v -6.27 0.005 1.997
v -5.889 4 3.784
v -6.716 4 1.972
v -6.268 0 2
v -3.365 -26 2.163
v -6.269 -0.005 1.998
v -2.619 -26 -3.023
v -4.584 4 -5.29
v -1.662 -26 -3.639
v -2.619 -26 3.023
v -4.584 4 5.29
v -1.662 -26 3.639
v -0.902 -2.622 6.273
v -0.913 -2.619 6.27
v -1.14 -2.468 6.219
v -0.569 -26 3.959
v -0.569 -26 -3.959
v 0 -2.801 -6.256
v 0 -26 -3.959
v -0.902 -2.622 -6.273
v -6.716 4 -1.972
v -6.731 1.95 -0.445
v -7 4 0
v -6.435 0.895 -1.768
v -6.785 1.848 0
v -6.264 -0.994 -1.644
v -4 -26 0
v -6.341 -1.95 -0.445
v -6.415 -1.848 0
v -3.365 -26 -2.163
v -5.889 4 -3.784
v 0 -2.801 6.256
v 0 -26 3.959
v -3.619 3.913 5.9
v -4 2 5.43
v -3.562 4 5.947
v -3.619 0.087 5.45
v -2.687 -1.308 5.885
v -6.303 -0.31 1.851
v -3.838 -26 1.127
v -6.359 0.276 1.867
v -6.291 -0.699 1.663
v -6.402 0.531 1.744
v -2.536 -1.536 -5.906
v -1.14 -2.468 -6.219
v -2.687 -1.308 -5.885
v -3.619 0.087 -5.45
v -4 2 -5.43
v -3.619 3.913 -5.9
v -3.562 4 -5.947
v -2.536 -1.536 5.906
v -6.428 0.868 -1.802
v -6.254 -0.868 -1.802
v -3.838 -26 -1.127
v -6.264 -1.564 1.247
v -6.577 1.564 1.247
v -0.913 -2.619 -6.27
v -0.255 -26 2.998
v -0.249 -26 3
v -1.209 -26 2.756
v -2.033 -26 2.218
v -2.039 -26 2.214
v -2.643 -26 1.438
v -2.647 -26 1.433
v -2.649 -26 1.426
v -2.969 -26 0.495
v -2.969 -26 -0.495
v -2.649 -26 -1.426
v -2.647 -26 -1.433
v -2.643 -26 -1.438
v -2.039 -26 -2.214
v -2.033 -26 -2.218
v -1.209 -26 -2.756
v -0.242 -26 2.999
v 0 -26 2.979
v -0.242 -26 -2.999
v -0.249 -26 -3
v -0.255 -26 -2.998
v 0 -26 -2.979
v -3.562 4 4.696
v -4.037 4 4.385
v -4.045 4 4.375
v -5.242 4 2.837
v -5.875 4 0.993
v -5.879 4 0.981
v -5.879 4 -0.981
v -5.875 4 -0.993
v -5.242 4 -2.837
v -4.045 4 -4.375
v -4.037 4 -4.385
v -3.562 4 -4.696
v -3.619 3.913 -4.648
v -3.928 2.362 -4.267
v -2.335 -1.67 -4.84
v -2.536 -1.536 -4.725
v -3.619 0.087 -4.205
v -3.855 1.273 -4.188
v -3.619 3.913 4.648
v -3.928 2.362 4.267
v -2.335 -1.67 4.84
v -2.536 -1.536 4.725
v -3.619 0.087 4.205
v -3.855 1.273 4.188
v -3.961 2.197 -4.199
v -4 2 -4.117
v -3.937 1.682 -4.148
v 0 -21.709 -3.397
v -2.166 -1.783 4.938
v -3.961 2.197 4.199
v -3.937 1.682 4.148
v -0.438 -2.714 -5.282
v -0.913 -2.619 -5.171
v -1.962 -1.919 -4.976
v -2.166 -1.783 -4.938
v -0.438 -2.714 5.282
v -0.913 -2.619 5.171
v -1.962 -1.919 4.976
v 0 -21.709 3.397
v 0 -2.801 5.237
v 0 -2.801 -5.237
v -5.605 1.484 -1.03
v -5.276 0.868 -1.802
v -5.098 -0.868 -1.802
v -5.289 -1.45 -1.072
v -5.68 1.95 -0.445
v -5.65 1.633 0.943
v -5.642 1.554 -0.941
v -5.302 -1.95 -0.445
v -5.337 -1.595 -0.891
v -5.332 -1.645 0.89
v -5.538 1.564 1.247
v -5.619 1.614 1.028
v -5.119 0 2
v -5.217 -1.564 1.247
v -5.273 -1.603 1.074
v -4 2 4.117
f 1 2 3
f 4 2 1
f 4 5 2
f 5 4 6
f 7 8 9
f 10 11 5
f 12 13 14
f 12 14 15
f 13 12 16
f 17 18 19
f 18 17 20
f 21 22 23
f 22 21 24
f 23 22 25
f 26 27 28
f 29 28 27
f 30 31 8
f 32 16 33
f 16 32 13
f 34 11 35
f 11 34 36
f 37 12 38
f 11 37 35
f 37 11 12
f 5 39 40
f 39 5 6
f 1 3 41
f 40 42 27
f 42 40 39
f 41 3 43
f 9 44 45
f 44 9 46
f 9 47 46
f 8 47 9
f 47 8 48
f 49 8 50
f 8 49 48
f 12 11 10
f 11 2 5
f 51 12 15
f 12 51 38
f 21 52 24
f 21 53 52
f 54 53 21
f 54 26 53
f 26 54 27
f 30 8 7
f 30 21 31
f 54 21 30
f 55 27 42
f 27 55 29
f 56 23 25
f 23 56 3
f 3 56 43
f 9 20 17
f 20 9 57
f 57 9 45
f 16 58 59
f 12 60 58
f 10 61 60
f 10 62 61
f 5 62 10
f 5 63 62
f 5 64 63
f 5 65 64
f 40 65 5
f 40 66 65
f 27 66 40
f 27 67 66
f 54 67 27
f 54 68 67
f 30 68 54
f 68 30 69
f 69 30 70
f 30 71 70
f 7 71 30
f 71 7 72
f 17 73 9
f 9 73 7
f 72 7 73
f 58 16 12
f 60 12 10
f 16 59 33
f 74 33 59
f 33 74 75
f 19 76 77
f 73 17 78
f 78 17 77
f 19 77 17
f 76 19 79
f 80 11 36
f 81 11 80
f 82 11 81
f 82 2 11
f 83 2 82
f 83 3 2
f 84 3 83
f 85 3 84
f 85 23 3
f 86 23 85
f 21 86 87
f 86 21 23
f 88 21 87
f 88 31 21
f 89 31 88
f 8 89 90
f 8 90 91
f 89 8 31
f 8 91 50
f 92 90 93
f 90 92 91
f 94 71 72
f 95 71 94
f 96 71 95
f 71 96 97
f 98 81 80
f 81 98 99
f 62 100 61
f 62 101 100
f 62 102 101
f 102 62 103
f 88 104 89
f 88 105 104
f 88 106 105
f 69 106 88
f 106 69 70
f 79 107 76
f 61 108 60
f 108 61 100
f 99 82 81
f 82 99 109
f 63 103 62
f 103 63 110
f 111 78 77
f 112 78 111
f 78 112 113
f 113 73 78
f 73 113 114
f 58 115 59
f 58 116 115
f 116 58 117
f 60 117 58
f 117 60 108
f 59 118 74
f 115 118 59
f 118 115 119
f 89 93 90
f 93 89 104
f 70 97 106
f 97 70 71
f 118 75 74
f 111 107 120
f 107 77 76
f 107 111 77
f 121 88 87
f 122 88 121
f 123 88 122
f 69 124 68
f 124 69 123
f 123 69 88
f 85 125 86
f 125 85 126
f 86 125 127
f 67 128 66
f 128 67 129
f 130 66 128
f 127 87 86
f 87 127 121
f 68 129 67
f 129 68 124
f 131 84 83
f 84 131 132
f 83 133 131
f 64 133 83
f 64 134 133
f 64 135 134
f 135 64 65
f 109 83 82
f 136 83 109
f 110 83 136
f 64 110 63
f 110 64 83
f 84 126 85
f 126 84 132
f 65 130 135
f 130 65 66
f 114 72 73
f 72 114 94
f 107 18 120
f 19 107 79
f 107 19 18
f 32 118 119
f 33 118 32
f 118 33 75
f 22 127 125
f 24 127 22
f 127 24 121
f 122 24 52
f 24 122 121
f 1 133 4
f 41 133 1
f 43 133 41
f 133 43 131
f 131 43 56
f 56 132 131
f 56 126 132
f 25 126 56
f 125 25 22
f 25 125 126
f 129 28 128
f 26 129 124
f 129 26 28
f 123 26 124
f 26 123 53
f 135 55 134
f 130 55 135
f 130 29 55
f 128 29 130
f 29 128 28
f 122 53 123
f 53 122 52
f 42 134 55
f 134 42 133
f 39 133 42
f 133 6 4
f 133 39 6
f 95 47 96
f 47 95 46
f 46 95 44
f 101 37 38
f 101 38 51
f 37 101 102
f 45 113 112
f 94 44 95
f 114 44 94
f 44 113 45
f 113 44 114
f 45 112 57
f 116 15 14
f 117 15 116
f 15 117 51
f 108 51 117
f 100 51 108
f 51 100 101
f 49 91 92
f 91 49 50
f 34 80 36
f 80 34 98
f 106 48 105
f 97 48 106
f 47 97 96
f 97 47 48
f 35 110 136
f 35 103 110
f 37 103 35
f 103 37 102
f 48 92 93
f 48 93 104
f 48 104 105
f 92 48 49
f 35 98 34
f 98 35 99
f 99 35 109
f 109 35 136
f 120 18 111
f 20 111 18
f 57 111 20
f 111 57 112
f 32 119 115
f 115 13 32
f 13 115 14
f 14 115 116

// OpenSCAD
//Variables de creacion.
Longitude=30; // [20:30]
rad_wrist=3; // [2:6]
rad_elbow=6; // [4:10]
thick=1; // [0.5:5]
rjoint=2; // [0.5:4]
Rarm=5; // [5:30]

module Shell(L,r_w,r_e,thick,rj){
difference() {
	translate([0,-L+rj+2,0])rotate([-90,0,0]) cylinder(L,r_w+thick,r_e+thick);
	translate([0,-L+rj+1.9,0])rotate([-90,0,0]) cylinder(L+0.5,r_w,r_e);
}}

//Cono hueco;
//Creamos un cono exterior con un grosor añadido y le quitamos el cono interior.
//Shell(Longitude,rad_wrist,rad_elbow,thick);

//Cortamos por la mitad

/*difference(){
	Shell(Longitude,rad_wrist,rad_elbow,thick,rjoint);
	translate([0,-70,-20])cube([50,100,50]);
	translate([10,0,0])rotate([0,-90,0]) cylinder(20,rjoint,rjoint);
	translate([10-rad_wrist-thick,2,-20])cylinder(50,10,10);
}*/

//translate([rad_wrist+thick+2,2,-40])cylinder(80,10,10);

module Shelly(L,r_w,r_e,thick,rj,rspatial){
	difference(){
		Shell(L,r_w,r_e,thick,rj);
		translate([0,-70,-20])cube([50,100,50]);
		translate([10,0,0])rotate([0,-90,0]) cylinder(20,rjoint,rjoint);
		translate([rspatial-rad_wrist-thick,2,-20])cylinder(50,rspatial,rspatial);
	}
}

Shelly(Longitude,rad_wrist,rad_elbow,thick,rjoint,Rarm);
